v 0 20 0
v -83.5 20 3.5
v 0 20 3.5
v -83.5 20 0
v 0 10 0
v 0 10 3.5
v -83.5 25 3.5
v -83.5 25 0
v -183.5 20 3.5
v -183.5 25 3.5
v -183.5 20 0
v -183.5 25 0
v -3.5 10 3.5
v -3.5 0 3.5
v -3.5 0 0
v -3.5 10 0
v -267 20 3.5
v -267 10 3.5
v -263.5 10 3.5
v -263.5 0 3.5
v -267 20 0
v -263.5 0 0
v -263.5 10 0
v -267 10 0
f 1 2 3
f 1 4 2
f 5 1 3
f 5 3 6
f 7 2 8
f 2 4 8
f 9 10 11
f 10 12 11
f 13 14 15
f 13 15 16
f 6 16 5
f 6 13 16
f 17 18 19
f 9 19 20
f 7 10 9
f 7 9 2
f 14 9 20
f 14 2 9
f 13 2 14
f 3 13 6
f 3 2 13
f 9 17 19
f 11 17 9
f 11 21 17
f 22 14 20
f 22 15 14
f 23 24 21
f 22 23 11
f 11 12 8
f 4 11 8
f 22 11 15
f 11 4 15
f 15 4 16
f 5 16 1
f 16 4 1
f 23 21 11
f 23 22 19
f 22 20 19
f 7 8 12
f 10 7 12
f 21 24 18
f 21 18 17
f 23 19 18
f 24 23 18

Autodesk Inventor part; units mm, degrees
ref_plane "YZ Plane" through (0, 0, 0) normal (1, 0, 0) x (0, 1, 0)
ref_plane "XZ Plane" through (0, 0, 0) normal (0, 1, 0) x (-1, 0, 0)
ref_plane "XY Plane" through (0, 0, 0) normal (0, 0, 1) x (1, 0, 0)
sketch "Sketch1" plane through (0, 0, 0) normal (0, 0, 1) x (1, 0, 0)
  line L0 (0, 0) -> (-267, 0)
  line L1 (-267, 0) -> (-267, 10)
  line L2 (-267, 10) -> (-263.5, 10)
  line L3 (-263.5, 10) -> (-263.5, 20)
  line L4 (-3.5, 20) -> (-3.5, 10)
  line L5 (-3.5, 10) -> (0, 10)
  line L6 (0, 10) -> (0, 0)
  line L7 (-83.5, 20) -> (-83.5, 25)
  line L8 (-83.5, 25) -> (-183.5, 25)
  line L9 (-183.5, 25) -> (-183.5, 20)
  line L10 (-263.5, 20) -> (-183.5, 20)
  line L11 (-83.5, 20) -> (-3.5, 20)
  dimension "d19" = 267
  dimension "d20" = 10
  dimension "d22" = 10
  dimension "d23" = 260
  dimension "d24" = 100
  dimension "d25" = 5
  dimension "d26" = 80
extrude "Extrusion1" add sketch "Sketch1" along normal blind 3.5
sketch "Sketch2" plane through (0, 0, 3.5) normal (0, 0, 1) x (1, 0, 0)
  line L0 (-267, 0) -> (0, 0) construction
  line L1 (0, 0) -> (0, 10) construction
  line L2 (0, 10) -> (-3.5, 10) projected
  line L3 (-3.5, 10) -> (-3.5, 20) projected
  line L4 (-3.5, 20) -> (-83.5, 20) construction
  line L5 (-83.5, 20) -> (-83.5, 25) construction
  line L6 (-83.5, 25) -> (-183.5, 25) construction
  line L7 (-183.5, 25) -> (-183.5, 20) construction
  line L8 (-183.5, 20) -> (-263.5, 20) construction
  line L9 (-263.5, 20) -> (-263.5, 10) projected
  line L10 (-263.5, 10) -> (-267, 10) projected
  line L11 (-267, 10) -> (-267, 0) construction
  line L12 (-263.5, 10) -> (-267, 10)
  line L13 (-267, 10) -> (-267, 20)
  line L14 (-267, 20) -> (-263.5, 20)
  line L15 (-263.5, 20) -> (-263.5, 10)
  line L16 (-3.5, 10) -> (0, 10)
  line L17 (0, 10) -> (0, 20)
  line L18 (0, 20) -> (-3.5, 20)
  line L19 (-3.5, 20) -> (-3.5, 10)
extrude "Extrusion2" add sketch "Sketch2" against normal blind 3.5
sketch "Sketch3" plane through (0, 0, 3.5) normal (0, 0, 1) x (1, 0, 0)
  line L0 (-267, 0) -> (0, 0) construction
  line L1 (0, 0) -> (0, 20) construction
  line L2 (0, 20) -> (-83.5, 20) construction
  line L3 (-83.5, 20) -> (-83.5, 25) construction
  line L4 (-83.5, 25) -> (-183.5, 25) construction
  line L5 (-183.5, 25) -> (-183.5, 20) construction
  line L6 (-183.5, 20) -> (-267, 20) construction
  line L7 (-267, 0) -> (-267, 20) construction
  line L8 (-267, 0) -> (-267, 20) projected
  line L9 (-267, 0) -> (-263.5, 0)
  line L10 (-263.5, 0) -> (-263.5, 10)
  line L11 (-263.5, 10) -> (-267, 10)
  line L12 (-267, 10) -> (-267, 0)
  line L13 (0, 0) -> (-3.5, 0)
  line L14 (-3.5, 0) -> (-3.5, 10)
  line L15 (-3.5, 10) -> (0, 10)
  line L16 (0, 10) -> (0, 0)
  dimension "d29" = 3.5
  dimension "d30" = 10
  dimension "d31" = 3.5
  dimension "d32" = 10
extrude "Extrusion3" cut sketch "Sketch3" against normal blind 3.5
properties part number "Refuerzo_Base"
